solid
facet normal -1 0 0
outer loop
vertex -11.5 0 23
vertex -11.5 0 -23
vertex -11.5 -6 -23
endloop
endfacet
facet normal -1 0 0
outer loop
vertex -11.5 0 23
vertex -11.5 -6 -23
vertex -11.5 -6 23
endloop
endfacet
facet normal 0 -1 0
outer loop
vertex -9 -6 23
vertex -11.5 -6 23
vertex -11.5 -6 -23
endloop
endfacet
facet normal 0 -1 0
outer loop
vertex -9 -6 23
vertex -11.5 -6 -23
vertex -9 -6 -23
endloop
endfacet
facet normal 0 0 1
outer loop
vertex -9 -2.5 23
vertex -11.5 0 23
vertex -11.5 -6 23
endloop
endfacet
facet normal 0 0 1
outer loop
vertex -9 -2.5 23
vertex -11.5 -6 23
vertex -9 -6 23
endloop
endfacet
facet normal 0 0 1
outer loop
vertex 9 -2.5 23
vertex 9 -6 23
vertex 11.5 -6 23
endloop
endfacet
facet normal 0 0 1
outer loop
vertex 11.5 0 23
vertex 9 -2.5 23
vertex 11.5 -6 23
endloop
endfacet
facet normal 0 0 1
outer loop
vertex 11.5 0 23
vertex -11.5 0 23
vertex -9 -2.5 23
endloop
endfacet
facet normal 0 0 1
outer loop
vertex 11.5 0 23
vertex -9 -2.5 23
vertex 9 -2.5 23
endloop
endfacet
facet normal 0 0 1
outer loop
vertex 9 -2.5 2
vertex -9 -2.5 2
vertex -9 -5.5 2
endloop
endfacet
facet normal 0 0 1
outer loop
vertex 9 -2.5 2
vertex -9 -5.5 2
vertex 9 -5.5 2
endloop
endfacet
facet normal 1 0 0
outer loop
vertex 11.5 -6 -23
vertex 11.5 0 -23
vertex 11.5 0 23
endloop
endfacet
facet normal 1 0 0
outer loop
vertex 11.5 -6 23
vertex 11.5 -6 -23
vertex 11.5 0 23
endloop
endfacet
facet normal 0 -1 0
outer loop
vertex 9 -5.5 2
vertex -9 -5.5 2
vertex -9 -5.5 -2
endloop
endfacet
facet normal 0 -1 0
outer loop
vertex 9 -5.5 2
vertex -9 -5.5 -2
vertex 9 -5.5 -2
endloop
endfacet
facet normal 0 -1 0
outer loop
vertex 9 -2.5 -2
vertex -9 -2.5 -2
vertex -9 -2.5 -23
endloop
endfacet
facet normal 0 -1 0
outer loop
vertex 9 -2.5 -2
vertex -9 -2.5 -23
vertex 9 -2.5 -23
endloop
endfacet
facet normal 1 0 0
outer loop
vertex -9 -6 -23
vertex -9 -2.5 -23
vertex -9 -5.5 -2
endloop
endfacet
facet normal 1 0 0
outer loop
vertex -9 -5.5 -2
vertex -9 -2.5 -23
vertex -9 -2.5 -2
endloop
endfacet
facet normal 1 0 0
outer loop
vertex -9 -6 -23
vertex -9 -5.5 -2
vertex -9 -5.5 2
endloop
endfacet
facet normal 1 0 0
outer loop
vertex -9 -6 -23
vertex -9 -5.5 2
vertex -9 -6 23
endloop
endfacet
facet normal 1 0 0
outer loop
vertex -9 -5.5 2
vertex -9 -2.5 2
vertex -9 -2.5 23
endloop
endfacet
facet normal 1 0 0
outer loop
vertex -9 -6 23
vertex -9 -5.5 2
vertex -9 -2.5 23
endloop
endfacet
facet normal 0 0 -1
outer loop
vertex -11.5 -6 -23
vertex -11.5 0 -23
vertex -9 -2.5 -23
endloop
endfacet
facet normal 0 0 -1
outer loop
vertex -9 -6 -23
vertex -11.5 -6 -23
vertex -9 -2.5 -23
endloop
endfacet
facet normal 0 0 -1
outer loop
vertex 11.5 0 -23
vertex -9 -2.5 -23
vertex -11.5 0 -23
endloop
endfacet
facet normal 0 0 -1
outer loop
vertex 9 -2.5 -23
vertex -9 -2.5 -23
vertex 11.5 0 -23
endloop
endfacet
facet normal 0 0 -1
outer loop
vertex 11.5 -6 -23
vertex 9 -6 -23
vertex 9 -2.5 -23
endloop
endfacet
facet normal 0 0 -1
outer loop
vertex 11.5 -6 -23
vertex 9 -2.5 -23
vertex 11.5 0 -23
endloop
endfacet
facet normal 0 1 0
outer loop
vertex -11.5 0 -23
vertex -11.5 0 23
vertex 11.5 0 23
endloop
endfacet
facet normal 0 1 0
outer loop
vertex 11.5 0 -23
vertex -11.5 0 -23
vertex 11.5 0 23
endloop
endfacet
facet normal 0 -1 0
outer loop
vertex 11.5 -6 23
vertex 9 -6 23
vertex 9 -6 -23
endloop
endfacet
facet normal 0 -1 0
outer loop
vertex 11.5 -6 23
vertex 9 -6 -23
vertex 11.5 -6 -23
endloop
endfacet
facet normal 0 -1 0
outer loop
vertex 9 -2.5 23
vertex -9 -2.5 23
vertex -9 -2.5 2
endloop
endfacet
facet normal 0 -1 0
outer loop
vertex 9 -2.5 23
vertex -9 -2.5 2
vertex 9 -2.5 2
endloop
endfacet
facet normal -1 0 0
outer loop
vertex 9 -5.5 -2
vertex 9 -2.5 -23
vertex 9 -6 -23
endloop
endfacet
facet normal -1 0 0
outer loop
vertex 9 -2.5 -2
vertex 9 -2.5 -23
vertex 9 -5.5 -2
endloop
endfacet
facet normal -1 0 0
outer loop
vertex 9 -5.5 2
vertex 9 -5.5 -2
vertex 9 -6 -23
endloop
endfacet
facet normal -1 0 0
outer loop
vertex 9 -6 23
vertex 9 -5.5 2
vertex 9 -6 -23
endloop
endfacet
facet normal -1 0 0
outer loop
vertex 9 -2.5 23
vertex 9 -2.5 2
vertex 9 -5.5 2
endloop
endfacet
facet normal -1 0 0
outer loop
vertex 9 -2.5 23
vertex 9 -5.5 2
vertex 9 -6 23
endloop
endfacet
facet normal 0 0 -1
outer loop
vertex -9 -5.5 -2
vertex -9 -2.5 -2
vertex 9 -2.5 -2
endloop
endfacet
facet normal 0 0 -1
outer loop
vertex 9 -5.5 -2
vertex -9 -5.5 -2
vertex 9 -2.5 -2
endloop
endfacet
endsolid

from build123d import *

# Parameters (mm, degrees)
F0_W     = 23
F0_H     = 60
F1_DEPTH = 6
F2_T     = -2.5
F3_W     = 23
F3_H     = 6
F4_DEPTH = 7
F5_W     = 23
F5_H     = 6
F6_DEPTH = 7
F7_W     = 18
F7_H     = 4
F8_DEPTH = 3


with BuildPart() as f1:
    # F0 (on Front) → F1 (new body)
    with BuildSketch(Plane.XZ):
        Rectangle(F0_W, F0_H)
    extrude(amount=F1_DEPTH)

    # F2
    f2_openings = [f1.faces().sort_by_distance(p)[0] for p in [
        (0, -6, 0),
    ]]
    offset(amount=F2_T, openings=f2_openings)

    # F3 (on face) → F4 (cut)
    with BuildSketch(Plane(origin=(0, 0, -30), x_dir=(1, 0, 0), z_dir=(0, 0, -1))):
        with Locations((0, 3)):
            Rectangle(F3_W, F3_H)
    extrude(amount=-F4_DEPTH, mode=Mode.SUBTRACT)

    # F5 (on face) → F6 (cut)
    with BuildSketch(Plane.XY.offset(30)):
        with Locations((0, -3)):
            Rectangle(F5_W, F5_H)
    extrude(amount=-F6_DEPTH, mode=Mode.SUBTRACT)

    # F7 (on face) → F8 (join)
    with BuildSketch(Plane.XZ.offset(2.5)):
        Rectangle(F7_W, F7_H)
    extrude(amount=F8_DEPTH)


solid = f1.part
